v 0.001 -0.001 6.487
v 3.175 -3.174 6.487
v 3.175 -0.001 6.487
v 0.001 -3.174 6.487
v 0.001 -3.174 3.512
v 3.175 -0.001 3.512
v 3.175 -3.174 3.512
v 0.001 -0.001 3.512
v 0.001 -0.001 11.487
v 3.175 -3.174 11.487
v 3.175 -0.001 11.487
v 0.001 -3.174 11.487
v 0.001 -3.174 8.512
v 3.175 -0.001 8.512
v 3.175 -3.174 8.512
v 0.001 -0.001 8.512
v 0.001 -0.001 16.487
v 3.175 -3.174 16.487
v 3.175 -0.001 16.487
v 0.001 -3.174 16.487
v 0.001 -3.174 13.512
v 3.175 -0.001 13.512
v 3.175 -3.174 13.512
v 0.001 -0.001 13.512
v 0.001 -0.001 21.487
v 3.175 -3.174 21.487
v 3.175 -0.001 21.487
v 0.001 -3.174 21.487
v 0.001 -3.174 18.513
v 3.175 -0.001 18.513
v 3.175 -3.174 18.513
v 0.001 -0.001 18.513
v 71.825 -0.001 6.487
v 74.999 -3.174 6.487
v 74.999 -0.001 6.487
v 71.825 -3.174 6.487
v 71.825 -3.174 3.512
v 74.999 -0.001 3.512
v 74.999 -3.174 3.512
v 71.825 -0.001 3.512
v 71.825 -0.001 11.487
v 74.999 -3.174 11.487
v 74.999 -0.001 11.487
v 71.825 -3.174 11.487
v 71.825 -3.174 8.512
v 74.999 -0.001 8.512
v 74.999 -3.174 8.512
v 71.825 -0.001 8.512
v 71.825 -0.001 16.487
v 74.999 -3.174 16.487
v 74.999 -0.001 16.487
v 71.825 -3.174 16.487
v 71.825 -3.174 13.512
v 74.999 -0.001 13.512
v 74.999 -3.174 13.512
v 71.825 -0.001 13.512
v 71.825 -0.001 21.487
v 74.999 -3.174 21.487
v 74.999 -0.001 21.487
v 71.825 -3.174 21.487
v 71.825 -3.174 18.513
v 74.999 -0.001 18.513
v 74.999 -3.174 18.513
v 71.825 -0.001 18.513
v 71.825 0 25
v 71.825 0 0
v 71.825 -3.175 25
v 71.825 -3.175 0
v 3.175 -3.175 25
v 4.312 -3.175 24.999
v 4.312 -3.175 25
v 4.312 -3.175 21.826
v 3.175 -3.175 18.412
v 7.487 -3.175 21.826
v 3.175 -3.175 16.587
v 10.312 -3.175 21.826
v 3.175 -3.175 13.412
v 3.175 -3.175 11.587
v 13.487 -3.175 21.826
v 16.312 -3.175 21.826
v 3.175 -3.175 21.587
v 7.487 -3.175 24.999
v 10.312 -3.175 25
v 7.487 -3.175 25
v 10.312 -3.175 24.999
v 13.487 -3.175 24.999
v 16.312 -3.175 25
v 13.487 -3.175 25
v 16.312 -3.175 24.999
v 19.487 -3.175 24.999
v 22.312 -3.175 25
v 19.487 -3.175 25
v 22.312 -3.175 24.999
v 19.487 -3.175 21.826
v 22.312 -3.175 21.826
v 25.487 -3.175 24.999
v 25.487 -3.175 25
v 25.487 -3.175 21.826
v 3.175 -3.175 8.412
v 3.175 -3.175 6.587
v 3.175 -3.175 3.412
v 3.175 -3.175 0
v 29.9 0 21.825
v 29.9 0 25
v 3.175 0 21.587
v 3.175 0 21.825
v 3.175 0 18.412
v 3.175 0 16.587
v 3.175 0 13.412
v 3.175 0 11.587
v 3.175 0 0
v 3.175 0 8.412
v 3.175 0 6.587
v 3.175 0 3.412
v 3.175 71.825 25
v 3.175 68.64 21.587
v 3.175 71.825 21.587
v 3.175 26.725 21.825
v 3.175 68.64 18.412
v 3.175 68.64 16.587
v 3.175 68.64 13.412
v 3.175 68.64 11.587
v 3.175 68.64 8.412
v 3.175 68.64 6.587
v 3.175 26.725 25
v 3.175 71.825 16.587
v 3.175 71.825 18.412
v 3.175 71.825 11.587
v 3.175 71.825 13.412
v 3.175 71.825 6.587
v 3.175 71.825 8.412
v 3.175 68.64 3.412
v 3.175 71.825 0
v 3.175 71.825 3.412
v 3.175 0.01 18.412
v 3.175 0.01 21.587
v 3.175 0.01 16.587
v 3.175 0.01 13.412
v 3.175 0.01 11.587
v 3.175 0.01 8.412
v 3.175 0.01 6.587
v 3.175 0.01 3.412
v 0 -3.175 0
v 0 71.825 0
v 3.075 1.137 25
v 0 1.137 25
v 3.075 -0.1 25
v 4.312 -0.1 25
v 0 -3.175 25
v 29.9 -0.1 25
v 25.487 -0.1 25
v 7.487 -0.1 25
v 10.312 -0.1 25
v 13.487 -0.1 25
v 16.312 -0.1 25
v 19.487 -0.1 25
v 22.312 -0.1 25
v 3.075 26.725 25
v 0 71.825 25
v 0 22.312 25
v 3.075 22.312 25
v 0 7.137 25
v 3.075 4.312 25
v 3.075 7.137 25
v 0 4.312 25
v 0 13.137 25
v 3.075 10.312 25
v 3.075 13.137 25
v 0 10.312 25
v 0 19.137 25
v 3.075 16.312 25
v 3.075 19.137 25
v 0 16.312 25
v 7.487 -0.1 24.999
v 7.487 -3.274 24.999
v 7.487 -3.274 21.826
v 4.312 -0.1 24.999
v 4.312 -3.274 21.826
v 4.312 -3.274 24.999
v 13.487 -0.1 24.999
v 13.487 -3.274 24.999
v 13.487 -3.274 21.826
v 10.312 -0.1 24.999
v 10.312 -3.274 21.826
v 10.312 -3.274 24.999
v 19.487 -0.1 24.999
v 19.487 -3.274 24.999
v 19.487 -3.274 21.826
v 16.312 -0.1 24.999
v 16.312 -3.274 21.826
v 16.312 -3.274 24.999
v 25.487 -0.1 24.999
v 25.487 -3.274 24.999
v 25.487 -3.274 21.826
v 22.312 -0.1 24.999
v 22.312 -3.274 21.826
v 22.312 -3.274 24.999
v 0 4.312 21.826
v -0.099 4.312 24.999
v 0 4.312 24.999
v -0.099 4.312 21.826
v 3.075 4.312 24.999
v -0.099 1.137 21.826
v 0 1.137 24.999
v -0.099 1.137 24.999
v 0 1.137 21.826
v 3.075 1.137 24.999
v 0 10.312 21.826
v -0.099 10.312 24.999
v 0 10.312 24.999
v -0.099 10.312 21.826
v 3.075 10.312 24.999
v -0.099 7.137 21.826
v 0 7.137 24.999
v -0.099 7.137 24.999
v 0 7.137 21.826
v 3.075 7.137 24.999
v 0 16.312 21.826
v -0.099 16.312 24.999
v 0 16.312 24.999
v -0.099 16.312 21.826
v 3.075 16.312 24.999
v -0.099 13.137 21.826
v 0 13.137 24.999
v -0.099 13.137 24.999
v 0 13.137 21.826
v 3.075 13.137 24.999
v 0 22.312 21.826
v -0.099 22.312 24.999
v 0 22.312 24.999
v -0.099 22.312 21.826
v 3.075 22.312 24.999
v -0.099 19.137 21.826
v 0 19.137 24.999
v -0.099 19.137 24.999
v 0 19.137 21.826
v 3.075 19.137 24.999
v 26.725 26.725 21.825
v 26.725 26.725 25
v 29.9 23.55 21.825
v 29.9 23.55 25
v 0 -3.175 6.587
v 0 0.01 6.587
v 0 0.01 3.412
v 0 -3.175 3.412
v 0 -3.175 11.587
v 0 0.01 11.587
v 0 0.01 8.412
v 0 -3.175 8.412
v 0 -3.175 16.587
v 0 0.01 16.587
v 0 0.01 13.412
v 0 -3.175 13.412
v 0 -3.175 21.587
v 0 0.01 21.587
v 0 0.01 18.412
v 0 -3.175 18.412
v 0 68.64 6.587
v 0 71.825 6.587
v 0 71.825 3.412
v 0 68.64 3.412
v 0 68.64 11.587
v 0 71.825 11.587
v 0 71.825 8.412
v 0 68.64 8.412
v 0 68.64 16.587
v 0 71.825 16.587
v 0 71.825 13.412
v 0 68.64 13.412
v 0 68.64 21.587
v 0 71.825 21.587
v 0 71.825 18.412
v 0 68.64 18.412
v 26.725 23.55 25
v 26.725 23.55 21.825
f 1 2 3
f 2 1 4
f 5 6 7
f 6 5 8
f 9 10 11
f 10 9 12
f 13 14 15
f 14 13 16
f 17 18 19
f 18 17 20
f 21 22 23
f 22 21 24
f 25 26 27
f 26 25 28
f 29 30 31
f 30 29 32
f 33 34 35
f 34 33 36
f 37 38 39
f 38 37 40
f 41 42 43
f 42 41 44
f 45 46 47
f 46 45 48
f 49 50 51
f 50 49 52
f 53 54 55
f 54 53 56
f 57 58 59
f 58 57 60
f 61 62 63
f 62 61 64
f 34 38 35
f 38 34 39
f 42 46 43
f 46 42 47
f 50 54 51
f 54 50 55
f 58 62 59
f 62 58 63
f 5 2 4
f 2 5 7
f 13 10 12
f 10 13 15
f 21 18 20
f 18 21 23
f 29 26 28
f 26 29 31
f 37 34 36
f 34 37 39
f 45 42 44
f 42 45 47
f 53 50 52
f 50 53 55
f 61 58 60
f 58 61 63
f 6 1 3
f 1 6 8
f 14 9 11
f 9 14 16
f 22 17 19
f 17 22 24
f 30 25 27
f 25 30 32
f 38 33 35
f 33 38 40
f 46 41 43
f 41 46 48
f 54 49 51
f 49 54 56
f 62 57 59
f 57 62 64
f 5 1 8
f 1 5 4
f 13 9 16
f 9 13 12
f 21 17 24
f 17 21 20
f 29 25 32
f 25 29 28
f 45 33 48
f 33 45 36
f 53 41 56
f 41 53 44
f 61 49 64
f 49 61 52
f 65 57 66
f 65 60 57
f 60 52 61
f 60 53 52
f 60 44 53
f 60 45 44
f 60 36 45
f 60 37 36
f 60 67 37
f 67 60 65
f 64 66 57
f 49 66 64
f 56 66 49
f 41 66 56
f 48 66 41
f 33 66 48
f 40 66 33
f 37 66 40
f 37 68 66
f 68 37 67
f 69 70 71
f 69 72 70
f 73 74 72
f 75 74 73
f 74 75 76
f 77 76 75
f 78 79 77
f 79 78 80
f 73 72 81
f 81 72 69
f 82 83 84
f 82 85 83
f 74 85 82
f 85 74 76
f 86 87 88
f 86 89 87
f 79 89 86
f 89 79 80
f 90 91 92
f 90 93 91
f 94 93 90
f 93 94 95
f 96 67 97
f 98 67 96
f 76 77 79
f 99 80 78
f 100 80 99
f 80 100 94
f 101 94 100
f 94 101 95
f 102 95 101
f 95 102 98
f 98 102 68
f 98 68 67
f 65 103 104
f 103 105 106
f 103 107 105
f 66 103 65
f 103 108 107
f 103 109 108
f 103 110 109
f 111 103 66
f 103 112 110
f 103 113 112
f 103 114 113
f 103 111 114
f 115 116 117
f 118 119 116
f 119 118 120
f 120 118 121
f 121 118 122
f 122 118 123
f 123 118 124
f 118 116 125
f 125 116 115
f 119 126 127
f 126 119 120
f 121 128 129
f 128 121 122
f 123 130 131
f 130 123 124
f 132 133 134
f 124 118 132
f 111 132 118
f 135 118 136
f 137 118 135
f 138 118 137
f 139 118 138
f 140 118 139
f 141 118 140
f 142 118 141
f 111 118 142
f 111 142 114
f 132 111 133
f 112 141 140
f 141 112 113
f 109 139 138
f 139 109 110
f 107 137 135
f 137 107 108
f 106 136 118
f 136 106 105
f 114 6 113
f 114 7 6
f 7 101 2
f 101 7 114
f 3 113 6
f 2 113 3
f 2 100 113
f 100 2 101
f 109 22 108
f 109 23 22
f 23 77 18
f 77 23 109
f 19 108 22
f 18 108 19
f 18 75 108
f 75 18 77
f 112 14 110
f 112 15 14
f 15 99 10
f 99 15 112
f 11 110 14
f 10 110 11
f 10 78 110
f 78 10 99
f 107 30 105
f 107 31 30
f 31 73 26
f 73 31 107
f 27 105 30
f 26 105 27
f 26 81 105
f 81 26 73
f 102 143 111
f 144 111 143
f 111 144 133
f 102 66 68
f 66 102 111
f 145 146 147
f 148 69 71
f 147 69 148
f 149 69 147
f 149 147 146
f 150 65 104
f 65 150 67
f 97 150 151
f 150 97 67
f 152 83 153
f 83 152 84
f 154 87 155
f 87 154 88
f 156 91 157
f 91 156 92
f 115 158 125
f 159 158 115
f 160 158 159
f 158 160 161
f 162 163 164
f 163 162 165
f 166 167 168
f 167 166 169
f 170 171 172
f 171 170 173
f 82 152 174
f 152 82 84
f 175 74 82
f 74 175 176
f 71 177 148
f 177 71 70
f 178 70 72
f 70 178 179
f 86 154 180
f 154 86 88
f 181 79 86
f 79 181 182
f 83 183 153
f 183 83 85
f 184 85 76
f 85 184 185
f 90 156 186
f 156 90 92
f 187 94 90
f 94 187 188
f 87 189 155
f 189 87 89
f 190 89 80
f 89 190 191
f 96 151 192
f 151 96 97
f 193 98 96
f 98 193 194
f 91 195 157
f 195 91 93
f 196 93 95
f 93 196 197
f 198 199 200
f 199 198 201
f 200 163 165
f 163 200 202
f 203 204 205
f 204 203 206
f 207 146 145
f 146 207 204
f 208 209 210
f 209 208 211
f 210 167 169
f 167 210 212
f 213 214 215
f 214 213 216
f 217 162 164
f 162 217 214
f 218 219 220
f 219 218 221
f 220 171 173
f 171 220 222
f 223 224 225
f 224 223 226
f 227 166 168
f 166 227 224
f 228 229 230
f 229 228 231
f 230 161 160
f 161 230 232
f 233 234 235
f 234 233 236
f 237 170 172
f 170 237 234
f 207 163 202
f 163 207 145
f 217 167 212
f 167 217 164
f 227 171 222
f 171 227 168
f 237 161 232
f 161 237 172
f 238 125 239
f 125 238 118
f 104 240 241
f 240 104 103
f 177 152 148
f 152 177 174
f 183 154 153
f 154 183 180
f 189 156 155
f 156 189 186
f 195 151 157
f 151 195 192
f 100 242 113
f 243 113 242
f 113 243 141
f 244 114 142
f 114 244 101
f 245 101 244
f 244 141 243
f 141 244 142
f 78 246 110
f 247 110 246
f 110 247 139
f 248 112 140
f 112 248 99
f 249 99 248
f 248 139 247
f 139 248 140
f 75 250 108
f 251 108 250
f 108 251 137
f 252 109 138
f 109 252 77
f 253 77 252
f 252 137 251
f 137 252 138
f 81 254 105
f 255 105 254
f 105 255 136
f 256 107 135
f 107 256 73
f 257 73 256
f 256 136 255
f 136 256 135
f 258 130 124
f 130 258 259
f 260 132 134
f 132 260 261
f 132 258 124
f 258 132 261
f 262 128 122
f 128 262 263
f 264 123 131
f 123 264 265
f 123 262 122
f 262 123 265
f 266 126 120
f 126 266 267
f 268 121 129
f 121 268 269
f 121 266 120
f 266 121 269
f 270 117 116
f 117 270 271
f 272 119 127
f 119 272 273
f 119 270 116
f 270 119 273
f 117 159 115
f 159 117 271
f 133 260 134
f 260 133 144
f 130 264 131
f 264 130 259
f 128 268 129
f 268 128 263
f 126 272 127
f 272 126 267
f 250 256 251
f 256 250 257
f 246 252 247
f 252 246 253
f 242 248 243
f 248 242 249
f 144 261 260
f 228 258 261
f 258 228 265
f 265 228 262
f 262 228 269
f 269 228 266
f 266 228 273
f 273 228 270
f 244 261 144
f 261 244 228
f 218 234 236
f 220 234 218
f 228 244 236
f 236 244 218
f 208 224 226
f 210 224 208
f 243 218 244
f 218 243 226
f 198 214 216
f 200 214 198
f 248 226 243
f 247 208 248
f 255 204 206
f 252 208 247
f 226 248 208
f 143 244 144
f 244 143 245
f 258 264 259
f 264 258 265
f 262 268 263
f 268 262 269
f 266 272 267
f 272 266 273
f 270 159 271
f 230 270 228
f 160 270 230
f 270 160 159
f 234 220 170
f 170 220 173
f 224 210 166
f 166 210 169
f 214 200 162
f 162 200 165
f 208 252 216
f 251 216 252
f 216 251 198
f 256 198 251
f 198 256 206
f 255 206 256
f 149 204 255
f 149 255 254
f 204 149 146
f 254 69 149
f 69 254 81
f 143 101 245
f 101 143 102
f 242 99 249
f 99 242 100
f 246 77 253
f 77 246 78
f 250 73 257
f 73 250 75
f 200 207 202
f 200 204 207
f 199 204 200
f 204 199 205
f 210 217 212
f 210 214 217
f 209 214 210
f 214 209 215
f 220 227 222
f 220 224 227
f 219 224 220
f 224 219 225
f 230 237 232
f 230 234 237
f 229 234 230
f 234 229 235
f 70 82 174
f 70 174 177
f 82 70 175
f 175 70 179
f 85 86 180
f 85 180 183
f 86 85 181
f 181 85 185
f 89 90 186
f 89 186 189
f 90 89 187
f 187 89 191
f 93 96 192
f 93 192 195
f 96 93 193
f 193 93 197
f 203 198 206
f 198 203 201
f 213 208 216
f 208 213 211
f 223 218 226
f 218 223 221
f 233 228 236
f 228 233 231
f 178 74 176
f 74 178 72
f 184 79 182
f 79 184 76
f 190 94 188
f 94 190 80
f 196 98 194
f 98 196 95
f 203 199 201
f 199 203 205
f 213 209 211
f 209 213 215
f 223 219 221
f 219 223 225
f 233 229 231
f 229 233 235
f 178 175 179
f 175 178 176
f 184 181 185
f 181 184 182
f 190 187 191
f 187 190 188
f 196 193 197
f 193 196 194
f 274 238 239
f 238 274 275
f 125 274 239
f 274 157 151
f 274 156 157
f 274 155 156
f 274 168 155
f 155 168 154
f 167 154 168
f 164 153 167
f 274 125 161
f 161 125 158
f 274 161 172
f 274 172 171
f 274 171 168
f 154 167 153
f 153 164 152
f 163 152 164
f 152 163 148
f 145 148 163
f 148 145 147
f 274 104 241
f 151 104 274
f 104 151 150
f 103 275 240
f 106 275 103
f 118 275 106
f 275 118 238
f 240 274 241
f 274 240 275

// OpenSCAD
th = 3.175;
x = 590.55;
y = 438.15;
h = 34.925;
k = 0.1; //kerf
f = 0.1; //fudge

//cube([x,th,h]);
//cube([th,y,h]);
//translate([x,0,0])cube([th,y,h]);
//translate([0,y,0])cube([x,th,h]);

module male(x,h) {
    
    union(){
        translate([th,0,0])
        cube([x-2*th,th,h]);
        intersection(){
            cube([x,th,h]);
            union(){
                for(i=[0.20:0.20:0.8]){
                    for(j=[0, x-th]){
                        translate([j,0,i*h-th/2+k])
                        cube([th,th,th-2*k]);
                    }
                }
            }
        }
    }
}

module female(x,h) {
    difference(){
        cube([x,th,h]);
        union(){
            for(i=[0.20:0.20:0.8]){
                for(j=[0, x-th]){
                    translate([j,0,i*h-th/2])
                    cube([th,th,th]);
                }
            }
        }
    }
}

//male(f*x,h);
//translate([0,f*y-th,0])male(f*x, h);
//translate([-th,0,0])rotate(90,[0,0,1])female(f*y, h);
//translate([f*x+2*th,0,0])rotate(90,[0,0,1])female(f*y, h);

// Provide x, y and z.  Knobs should be same as z.
//  Also need a true/false for each side.  Go with 4 fixed
//  knobs at present.
// x and y are the absolute distances

module side(x, y, z, gender,b,l,t,r, kerf) {
    module teeth(tw,tz,k=0){
        for(i=[0.20:0.20:0.8]){
            translate([i*tw-tz/2+k,-.01,-.01])
            cube([tz-2*k,tz+.02,tz+.02]);
        }
    }
    module female(k=0){
        difference(){
            cube([x,y,z]);
            union(){
                if(b>0)teeth(x,z,k);
                if(t>0)translate([0,y-z,0])teeth(x,z,k);
                if(l>0)rotate(90,[0,0,1])translate([0,-z,0])teeth(y,z,k);
                if(r>0)translate([x-z,0,0])
                    rotate(90,[0,0,1])translate([0,-z,0])teeth(y,z,k);
                
            }
        }
    }

    
// Female piece
    if(gender==0) {
        female();
    }
    else {
// Male piece with kerf
        if(b==0)translate([z,0,0])cube([x-2*z,z,z]);
        if(l==0)translate([0,z,0])cube([z,y-2*z,z]);
        if(t==0)translate([z,y-z,0])cube([x-2*z,z,z]);
        if(r==0)translate([x-z,z,0])cube([z,y-2*z,z]);
        translate([z,z,0])cube([x-2*z,y-2*z,z]);
        difference(){
            translate([0.001,0.001,+0.001])
            cube([x-0.002,y-0.002,z-.002]);
            female(kerf);
        }
    
    }
}

module temp() {
    translate([-0.1,-th-0.1,25-th+0.1])
    side(30,30,th,1,1,1,0,0,0);
}


difference(){
    rotate(90,[1,0,0])color("red")
    side(75,25,th,1,0,1,0,1,0.1);
    temp();
}

difference(){
    translate([0,-th,0])
    rotate(90,[0,1,0])rotate(90,[0,0,1])color("green")
    side(75,25,th,0,0,1,0,1,0.1);
    temp();
}

color("blue")
translate([-0.1,-th-0.1,25-th])
side(30,30,th,1,1,1,0,0,0.0);
